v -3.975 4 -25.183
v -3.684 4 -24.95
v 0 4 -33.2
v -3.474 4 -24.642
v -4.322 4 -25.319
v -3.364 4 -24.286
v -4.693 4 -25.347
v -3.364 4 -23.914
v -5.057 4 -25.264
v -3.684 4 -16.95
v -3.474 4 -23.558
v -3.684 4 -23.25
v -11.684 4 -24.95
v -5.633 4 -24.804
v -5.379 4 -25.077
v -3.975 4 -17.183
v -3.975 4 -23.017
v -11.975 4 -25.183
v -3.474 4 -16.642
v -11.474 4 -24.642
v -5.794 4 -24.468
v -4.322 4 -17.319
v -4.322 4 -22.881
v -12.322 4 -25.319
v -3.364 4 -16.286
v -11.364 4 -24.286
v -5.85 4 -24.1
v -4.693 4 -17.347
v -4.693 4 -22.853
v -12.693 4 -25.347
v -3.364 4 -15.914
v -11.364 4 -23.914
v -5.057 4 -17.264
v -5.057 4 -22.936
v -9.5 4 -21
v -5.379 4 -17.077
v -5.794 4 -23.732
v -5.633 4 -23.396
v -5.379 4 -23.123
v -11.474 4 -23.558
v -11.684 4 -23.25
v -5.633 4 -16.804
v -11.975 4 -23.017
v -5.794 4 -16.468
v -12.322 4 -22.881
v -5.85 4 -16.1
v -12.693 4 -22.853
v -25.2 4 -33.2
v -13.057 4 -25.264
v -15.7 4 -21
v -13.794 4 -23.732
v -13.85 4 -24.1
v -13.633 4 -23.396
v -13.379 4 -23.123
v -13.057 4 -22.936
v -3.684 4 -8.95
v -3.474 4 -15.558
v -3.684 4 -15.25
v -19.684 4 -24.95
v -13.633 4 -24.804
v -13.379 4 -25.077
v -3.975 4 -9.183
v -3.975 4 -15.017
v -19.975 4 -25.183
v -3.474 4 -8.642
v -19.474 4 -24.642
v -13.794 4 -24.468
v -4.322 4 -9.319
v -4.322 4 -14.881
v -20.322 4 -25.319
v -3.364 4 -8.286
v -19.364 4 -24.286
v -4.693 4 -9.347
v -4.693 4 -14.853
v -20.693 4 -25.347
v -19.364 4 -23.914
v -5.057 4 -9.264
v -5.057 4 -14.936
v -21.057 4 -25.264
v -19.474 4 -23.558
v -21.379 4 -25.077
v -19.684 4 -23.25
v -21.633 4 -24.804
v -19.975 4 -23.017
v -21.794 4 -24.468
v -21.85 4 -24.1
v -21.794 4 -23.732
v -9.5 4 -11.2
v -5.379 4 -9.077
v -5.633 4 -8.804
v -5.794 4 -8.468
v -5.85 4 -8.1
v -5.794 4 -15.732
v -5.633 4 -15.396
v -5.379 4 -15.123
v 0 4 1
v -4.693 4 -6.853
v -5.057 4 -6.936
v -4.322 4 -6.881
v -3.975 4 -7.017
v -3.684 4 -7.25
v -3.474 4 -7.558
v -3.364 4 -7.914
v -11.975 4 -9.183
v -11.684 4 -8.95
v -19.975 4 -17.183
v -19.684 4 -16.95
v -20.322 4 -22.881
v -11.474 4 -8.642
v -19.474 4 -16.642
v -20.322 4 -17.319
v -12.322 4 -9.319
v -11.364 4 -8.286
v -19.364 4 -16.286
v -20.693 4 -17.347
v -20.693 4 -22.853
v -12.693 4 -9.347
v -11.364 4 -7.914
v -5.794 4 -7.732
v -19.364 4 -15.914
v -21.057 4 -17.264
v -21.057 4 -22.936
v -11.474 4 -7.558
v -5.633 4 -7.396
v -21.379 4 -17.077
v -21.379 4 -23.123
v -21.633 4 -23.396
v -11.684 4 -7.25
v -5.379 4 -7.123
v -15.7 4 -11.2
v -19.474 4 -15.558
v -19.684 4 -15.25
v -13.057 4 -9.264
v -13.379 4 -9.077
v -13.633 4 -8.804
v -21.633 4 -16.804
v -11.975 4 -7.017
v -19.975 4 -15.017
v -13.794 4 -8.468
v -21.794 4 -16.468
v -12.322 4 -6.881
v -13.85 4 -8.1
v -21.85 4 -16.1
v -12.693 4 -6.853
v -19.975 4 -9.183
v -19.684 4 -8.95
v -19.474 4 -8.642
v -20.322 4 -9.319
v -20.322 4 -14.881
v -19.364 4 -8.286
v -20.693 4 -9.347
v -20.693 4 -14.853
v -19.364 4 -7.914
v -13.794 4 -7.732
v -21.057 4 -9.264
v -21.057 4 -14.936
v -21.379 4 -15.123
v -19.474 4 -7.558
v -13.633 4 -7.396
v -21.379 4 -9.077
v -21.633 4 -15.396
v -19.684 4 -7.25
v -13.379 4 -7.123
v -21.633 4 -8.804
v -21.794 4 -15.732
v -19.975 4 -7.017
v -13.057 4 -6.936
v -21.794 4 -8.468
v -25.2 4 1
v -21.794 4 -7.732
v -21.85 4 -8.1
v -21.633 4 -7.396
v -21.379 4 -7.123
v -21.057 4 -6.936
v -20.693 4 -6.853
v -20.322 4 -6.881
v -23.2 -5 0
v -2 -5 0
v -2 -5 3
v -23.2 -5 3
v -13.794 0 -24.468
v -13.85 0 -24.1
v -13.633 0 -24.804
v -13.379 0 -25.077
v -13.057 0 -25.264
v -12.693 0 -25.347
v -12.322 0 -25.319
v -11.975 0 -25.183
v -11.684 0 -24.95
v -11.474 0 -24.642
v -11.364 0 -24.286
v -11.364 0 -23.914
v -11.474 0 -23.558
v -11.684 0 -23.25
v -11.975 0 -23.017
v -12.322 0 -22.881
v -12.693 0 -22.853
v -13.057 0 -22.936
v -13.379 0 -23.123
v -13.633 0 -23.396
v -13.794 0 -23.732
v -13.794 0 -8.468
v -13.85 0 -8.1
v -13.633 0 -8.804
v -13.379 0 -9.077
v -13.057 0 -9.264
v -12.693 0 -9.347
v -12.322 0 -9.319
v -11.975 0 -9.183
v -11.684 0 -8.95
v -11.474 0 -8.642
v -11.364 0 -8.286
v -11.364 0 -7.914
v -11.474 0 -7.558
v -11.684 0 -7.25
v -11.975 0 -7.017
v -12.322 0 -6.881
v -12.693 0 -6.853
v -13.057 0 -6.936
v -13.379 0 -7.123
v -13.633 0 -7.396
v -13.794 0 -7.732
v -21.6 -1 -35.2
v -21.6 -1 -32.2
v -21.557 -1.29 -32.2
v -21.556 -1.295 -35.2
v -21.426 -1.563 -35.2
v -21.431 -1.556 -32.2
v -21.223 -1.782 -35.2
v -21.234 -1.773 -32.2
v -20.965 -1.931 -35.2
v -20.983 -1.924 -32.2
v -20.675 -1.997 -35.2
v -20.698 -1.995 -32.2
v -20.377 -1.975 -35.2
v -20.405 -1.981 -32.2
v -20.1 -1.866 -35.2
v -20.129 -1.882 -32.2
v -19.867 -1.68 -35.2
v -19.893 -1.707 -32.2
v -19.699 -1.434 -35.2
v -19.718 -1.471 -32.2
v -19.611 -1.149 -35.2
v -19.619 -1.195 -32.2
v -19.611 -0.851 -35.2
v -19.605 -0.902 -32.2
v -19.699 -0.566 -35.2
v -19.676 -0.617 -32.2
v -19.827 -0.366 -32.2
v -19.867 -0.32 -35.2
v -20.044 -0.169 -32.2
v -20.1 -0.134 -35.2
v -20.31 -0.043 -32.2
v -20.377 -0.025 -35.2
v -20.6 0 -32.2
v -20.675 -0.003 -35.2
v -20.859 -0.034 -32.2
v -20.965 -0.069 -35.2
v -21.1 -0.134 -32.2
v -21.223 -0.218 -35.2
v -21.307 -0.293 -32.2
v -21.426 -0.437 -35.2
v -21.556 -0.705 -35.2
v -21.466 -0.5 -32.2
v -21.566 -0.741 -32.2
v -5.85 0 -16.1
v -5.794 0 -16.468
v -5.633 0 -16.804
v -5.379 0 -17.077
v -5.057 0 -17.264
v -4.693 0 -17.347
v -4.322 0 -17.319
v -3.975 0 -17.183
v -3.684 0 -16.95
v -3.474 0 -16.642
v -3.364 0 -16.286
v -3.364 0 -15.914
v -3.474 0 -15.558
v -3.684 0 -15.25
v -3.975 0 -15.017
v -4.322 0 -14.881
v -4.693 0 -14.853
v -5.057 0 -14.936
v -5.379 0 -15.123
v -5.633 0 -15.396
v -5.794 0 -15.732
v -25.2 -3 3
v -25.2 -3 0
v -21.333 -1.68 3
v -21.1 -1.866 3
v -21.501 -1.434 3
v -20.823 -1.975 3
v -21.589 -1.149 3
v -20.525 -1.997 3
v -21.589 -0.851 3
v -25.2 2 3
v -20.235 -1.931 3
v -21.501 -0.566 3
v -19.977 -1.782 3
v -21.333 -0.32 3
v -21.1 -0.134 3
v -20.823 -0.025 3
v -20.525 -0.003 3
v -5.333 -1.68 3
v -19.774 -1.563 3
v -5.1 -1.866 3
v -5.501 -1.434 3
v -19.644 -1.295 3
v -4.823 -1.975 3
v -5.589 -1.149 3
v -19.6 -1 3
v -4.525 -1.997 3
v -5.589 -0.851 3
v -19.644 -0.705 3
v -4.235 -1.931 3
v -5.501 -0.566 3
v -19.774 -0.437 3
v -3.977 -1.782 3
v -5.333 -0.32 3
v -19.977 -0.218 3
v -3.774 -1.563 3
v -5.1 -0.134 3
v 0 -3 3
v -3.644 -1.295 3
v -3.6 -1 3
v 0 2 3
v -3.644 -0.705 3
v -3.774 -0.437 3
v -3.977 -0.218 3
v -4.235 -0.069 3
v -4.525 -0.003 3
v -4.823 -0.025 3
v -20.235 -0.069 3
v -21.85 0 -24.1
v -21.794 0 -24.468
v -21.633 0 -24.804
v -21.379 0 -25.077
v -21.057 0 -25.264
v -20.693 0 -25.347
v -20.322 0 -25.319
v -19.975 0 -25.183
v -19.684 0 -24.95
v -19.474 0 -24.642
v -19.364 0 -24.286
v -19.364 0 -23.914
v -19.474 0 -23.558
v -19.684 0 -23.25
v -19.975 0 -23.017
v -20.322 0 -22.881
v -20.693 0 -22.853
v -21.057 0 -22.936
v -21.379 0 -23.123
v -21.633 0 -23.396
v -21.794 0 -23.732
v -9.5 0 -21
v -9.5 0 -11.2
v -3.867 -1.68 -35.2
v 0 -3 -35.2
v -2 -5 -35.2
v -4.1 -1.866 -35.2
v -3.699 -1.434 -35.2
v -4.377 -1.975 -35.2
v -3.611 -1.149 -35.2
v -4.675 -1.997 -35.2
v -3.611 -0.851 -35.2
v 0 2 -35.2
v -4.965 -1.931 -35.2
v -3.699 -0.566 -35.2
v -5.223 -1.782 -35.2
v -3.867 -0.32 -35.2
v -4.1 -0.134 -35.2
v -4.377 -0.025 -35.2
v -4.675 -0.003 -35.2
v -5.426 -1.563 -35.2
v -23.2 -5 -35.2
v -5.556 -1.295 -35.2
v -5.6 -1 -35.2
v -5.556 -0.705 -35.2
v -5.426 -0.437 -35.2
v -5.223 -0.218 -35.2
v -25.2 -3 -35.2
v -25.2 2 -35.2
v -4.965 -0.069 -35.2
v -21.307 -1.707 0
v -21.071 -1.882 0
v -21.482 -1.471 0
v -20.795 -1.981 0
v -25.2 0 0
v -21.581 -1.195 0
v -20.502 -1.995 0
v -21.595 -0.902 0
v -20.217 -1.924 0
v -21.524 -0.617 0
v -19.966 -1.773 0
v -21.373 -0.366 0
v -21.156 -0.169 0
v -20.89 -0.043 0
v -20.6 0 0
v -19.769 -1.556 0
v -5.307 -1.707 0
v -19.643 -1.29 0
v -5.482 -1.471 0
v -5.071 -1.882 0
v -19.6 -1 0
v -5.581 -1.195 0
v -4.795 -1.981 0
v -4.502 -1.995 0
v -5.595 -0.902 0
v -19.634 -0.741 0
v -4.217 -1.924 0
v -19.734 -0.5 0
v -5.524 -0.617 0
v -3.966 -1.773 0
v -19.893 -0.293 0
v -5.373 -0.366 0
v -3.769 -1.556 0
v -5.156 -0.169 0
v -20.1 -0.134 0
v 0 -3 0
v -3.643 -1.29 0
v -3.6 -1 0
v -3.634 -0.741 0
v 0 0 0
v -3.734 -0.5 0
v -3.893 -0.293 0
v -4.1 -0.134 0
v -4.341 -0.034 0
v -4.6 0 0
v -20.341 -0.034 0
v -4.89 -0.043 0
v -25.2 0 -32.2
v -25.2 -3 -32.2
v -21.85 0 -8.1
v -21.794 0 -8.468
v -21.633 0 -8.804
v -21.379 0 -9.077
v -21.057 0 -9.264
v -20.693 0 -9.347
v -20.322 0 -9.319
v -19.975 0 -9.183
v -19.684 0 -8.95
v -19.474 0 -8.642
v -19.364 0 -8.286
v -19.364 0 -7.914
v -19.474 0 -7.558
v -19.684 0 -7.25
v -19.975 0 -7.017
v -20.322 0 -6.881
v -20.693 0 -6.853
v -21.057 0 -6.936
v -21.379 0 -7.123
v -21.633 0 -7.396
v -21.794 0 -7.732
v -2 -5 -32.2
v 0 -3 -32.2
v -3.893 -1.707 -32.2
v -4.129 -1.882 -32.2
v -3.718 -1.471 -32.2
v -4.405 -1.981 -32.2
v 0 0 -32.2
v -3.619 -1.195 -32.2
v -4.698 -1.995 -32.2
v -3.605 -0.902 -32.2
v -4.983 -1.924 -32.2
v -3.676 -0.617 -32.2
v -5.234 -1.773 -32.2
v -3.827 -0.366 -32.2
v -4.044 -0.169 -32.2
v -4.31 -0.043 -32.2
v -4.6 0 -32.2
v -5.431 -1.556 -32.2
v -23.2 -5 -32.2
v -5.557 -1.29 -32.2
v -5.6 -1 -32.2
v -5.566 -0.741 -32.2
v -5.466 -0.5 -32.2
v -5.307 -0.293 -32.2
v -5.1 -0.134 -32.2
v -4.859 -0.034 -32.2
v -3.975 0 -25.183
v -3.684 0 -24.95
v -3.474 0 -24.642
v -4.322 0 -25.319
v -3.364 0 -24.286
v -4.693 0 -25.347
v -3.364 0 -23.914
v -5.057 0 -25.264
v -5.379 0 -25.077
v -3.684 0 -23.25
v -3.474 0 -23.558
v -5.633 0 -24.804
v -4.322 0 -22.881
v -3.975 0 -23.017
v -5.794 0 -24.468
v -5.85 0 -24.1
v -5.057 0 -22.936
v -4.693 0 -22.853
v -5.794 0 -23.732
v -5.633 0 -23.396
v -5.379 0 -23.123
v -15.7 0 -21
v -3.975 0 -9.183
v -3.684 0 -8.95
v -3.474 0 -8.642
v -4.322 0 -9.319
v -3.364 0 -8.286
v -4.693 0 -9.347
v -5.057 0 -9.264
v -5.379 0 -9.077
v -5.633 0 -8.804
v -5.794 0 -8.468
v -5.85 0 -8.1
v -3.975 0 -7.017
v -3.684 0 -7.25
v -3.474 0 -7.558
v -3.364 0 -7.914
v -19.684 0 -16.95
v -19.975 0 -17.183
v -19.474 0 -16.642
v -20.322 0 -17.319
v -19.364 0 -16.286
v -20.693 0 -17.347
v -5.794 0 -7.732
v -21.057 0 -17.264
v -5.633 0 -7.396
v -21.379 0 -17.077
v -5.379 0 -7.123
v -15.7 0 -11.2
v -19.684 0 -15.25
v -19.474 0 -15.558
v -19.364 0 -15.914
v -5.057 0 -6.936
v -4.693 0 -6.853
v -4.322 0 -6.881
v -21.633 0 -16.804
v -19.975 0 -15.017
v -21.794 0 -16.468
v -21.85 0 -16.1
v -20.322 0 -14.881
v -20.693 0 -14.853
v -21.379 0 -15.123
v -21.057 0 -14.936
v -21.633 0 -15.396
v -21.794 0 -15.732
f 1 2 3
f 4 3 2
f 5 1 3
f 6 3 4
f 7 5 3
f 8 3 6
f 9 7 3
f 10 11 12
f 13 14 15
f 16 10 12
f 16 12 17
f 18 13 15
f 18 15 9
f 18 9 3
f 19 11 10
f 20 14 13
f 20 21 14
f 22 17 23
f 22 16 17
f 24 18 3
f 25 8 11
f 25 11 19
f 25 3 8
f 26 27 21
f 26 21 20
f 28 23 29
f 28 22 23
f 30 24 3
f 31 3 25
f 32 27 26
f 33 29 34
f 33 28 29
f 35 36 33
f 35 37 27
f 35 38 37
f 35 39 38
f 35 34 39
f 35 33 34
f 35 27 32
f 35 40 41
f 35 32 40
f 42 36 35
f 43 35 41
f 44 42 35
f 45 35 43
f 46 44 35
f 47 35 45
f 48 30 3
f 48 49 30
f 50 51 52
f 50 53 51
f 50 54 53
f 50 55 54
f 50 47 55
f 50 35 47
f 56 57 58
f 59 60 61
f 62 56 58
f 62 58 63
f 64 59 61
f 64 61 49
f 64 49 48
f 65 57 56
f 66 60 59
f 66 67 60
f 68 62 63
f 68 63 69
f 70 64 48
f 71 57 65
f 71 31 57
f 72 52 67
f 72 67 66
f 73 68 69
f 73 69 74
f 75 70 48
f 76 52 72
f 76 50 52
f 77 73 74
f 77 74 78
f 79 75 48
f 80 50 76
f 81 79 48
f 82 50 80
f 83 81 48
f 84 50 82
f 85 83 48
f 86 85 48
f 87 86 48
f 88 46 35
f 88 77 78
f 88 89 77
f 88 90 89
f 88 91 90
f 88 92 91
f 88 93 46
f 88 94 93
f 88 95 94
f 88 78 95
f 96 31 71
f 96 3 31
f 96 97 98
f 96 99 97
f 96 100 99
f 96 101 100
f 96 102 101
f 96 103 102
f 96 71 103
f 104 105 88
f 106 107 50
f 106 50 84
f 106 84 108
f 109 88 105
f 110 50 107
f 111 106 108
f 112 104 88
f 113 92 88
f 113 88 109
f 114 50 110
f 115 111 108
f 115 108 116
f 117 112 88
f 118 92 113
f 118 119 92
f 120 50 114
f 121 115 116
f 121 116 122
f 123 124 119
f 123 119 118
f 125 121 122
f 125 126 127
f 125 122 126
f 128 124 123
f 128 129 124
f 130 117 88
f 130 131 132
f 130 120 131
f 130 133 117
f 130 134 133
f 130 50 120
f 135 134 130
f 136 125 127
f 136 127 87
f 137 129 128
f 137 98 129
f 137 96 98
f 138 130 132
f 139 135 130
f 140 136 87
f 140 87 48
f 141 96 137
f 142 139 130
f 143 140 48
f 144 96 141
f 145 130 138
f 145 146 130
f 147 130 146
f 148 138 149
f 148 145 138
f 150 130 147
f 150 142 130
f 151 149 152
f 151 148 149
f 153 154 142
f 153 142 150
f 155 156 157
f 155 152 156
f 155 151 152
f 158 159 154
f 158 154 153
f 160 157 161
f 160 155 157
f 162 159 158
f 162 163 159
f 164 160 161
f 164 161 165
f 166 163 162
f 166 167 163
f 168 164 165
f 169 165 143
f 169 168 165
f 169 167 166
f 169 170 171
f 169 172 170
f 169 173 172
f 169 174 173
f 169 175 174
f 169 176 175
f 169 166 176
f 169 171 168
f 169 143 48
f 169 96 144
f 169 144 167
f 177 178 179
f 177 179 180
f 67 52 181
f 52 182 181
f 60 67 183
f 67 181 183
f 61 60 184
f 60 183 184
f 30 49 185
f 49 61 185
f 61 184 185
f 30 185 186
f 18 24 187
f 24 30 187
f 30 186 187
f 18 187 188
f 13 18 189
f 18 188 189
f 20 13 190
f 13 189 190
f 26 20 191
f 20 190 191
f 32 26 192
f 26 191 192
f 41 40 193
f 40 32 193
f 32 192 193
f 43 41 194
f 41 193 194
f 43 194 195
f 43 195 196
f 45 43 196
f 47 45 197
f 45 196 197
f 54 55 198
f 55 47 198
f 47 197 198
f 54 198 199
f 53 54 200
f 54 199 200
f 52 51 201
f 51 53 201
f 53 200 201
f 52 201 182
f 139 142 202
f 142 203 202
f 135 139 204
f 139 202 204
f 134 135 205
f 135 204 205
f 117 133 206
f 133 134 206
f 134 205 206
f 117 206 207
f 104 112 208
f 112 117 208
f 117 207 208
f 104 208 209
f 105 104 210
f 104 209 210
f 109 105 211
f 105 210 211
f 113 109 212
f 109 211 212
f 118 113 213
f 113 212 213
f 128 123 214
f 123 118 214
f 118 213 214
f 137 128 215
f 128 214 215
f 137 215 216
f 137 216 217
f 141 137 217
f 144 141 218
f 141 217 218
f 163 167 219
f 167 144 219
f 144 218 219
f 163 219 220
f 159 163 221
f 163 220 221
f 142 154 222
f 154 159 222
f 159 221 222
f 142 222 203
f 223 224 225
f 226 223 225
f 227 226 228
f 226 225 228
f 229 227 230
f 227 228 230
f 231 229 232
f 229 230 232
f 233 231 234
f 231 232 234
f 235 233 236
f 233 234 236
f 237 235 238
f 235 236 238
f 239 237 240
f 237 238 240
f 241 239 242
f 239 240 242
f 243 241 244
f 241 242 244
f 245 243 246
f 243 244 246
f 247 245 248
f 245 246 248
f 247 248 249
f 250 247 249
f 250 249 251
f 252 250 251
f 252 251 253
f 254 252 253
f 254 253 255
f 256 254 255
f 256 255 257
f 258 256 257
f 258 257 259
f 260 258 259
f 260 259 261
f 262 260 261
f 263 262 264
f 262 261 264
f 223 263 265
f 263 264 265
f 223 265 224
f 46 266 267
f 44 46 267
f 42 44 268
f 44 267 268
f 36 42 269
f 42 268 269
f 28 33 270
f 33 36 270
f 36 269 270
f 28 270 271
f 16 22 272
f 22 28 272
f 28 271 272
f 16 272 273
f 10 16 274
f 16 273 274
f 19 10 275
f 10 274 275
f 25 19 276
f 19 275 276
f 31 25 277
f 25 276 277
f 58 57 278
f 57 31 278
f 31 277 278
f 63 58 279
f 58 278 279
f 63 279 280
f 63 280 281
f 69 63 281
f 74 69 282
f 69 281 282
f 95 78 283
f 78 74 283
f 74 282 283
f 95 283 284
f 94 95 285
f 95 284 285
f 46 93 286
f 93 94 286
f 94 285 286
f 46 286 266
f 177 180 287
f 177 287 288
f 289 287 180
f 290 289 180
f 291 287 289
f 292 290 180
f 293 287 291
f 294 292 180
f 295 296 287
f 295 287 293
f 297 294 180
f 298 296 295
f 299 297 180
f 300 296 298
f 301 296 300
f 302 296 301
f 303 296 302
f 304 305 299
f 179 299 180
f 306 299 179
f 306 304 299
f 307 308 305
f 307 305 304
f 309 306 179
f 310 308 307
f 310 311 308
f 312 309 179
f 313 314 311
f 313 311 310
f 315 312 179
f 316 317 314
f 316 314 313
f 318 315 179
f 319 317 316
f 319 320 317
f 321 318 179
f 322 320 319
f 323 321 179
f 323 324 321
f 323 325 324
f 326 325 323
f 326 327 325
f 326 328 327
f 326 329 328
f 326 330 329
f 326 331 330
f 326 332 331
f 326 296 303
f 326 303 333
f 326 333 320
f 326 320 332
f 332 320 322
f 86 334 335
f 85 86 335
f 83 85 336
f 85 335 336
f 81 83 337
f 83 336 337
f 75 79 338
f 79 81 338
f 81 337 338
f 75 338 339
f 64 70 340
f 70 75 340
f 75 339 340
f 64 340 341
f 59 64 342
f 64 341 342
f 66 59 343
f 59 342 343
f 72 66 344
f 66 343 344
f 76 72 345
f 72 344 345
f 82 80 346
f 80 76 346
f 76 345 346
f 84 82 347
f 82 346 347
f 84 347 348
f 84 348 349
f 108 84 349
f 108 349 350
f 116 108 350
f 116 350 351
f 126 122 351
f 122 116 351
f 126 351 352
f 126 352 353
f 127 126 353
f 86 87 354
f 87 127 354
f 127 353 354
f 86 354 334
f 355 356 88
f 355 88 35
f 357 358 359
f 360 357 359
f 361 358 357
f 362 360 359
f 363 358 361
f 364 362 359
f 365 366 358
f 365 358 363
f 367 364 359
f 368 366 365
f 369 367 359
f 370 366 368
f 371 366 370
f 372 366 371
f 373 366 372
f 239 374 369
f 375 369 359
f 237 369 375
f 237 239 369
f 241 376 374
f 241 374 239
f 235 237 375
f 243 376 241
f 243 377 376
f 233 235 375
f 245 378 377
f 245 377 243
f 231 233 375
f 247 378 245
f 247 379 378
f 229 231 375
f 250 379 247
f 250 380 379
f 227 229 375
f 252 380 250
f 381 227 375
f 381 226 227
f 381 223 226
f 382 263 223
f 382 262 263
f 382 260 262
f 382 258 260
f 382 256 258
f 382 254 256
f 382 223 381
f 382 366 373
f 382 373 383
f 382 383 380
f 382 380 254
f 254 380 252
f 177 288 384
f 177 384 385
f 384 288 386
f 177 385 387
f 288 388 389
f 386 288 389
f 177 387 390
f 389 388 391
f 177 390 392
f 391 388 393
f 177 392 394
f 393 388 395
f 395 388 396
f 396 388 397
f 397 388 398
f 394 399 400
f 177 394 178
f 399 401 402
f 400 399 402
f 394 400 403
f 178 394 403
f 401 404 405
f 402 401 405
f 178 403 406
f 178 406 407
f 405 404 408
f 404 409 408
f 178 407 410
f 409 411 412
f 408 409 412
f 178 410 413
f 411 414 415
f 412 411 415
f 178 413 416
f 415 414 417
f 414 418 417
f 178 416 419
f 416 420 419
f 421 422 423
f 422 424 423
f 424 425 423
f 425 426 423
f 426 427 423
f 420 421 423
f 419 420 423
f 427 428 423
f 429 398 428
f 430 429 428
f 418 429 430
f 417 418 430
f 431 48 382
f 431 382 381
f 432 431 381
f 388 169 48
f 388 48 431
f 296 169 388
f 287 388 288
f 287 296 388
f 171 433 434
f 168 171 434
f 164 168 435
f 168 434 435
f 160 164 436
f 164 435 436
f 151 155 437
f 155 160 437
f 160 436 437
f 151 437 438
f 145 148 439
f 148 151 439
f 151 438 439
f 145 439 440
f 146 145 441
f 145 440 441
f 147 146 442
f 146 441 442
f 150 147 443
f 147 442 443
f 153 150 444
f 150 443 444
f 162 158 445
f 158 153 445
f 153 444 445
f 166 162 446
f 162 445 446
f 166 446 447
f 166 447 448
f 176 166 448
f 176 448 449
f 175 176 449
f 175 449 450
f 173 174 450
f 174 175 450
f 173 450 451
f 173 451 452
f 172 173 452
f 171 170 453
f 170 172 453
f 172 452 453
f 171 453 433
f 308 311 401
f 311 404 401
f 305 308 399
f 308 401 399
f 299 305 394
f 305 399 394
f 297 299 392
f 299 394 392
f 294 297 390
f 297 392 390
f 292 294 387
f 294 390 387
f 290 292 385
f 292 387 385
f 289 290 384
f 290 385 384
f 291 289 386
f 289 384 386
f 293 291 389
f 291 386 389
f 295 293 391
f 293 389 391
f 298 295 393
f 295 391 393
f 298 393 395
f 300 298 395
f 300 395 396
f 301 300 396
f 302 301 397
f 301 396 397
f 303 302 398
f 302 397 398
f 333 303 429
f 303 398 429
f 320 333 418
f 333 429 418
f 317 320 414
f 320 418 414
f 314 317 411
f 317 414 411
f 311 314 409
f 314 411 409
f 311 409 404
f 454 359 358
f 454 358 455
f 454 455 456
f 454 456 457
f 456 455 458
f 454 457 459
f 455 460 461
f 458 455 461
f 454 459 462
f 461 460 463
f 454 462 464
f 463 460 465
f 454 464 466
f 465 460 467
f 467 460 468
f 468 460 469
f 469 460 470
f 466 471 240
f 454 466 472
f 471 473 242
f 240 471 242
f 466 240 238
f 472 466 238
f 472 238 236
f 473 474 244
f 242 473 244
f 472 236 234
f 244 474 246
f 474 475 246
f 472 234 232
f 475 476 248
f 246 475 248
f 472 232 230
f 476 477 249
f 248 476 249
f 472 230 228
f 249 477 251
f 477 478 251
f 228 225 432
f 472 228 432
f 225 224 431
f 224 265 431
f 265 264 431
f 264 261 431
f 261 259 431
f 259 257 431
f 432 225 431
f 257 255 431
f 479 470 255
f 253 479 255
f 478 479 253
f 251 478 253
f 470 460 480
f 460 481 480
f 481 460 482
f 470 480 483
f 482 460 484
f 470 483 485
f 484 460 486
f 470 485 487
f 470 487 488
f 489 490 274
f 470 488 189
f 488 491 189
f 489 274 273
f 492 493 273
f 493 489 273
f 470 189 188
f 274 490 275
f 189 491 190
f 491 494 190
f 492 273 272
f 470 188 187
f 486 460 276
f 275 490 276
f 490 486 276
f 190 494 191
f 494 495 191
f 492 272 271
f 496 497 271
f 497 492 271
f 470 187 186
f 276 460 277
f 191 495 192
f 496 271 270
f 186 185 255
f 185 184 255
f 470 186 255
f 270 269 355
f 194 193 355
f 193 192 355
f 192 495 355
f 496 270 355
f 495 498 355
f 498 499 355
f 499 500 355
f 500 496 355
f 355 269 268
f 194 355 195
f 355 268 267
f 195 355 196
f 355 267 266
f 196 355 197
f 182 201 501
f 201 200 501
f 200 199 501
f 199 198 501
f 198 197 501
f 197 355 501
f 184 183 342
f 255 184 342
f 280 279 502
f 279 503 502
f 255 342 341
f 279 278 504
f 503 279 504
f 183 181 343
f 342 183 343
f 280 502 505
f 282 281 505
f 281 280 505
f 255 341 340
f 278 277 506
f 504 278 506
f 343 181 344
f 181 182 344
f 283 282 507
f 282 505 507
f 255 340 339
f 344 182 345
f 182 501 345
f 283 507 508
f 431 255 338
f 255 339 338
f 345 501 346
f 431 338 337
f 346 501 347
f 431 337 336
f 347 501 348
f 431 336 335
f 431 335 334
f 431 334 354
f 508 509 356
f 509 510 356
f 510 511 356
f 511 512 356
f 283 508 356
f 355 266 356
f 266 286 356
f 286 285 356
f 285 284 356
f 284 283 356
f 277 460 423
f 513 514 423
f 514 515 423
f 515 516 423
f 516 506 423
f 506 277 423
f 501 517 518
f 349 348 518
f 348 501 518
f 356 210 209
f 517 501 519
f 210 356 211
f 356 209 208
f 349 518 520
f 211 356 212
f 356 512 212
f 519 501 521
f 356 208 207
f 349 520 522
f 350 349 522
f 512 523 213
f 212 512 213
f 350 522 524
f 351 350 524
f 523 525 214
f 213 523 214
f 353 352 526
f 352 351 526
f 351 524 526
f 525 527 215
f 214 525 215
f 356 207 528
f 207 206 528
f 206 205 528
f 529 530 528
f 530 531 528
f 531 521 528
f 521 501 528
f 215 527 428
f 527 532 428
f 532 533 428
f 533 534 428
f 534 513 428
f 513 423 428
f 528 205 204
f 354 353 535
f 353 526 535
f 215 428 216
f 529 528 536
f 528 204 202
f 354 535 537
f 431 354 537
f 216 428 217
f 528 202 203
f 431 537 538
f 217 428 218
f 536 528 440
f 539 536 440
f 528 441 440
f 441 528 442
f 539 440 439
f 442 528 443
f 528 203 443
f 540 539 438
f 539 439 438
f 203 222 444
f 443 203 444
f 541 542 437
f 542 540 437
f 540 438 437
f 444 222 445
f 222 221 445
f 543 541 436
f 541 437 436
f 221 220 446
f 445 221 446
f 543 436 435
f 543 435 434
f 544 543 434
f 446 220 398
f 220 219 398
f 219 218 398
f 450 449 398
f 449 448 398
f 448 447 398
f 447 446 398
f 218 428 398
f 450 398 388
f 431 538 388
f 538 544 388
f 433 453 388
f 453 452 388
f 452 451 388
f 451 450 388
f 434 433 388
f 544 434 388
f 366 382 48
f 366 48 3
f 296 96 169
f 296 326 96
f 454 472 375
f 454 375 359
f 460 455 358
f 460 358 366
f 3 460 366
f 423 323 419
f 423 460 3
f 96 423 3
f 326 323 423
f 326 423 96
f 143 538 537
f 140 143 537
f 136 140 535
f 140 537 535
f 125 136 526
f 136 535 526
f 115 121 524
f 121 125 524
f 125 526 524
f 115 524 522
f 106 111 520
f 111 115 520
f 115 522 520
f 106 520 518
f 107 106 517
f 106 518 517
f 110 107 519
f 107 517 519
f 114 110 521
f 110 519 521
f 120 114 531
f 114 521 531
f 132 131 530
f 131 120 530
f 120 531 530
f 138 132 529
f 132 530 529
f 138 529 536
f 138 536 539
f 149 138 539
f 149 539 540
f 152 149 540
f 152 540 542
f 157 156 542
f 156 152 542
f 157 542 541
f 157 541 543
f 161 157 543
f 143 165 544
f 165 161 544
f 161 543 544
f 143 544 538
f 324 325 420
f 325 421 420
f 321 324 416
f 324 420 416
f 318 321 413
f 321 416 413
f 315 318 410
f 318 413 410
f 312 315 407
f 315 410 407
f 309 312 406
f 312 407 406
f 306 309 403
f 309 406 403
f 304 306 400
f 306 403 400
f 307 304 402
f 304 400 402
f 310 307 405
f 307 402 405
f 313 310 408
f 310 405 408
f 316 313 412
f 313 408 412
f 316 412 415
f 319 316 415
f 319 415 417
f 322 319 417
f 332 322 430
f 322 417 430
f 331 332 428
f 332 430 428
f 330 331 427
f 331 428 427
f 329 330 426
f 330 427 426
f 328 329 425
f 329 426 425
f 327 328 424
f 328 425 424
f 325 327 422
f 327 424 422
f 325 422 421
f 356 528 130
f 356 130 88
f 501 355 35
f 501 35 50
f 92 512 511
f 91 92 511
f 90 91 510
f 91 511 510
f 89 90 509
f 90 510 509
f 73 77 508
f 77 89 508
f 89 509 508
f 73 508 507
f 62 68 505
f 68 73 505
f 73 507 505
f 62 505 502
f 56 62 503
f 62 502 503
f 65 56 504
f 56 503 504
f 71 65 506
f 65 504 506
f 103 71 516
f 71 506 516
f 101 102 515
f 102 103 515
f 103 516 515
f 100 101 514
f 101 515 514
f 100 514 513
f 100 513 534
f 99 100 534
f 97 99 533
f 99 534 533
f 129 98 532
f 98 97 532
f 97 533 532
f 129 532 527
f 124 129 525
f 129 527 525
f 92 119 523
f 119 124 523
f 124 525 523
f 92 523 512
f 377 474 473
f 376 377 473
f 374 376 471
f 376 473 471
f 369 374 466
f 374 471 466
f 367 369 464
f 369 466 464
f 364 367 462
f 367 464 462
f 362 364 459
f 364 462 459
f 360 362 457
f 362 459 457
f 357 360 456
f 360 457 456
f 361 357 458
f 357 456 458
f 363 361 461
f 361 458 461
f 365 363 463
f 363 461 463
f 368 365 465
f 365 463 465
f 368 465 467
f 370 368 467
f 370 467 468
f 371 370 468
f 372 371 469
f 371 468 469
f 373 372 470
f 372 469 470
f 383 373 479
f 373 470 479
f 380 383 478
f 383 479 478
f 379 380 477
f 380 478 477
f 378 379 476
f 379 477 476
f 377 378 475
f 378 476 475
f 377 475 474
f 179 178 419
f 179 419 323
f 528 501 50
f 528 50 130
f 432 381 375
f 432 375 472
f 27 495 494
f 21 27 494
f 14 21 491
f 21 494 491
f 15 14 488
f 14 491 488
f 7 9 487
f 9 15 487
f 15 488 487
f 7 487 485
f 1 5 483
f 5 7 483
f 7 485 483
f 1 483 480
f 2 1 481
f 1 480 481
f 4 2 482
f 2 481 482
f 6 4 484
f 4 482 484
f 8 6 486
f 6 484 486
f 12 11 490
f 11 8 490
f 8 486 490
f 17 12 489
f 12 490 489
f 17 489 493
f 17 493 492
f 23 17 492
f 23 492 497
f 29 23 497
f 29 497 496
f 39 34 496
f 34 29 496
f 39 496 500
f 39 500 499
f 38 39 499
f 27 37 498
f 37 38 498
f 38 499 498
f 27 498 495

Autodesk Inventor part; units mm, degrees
ref_plane "YZ Plane" through (0, 0, 0) normal (1, 0, 0) x (0, 1, 0)
ref_plane "XZ Plane" through (0, 0, 0) normal (0, 1, 0) x (-1, 0, 0)
ref_plane "XY Plane" through (0, 0, 0) normal (0, 0, 1) x (1, 0, 0)
sketch "Sketch1" plane through (0, 0, 0) normal (0, 1, 0) x (-1, 0, 0)
  line L0 (0, 0) -> (25.2, 0)
  line L1 (25.2, 0) -> (25.2, -32.2)
  line L2 (25.2, -32.2) -> (0, -32.2)
  line L3 (0, -32.2) -> (0, 0)
  line L4 (15.7, -11.2) -> (9.5, -11.2)
  line L5 (9.5, -11.2) -> (9.5, -21)
  line L6 (9.5, -21) -> (15.7, -21)
  line L7 (15.7, -21) -> (15.7, -11.2)
  circle A0 centre (20.6, -8.1) radius 1.25
  circle A1 centre (20.6, -16.1) radius 1.25
  circle A2 centre (20.6, -24.1) radius 1.25
  circle A3 centre (12.6, -8.1) radius 1.25
  circle A4 centre (12.6, -16.1) radius 1.25
  circle A5 centre (12.6, -24.1) radius 1.25
  circle A6 centre (4.6, -8.1) radius 1.25
  circle A7 centre (4.6, -16.1) radius 1.25
  circle A8 centre (4.6, -24.1) radius 1.25
  dimension "d0" = 25.2
  dimension "d1" = 32.2
  dimension "d2" = 9.5
  dimension "d3" = 9.5
  dimension "d4" = 11.2
  dimension "d5" = 11.2
  dimension "d6" = 2.5
  dimension "d9" = 8
  dimension "d12" = 8
  dimension "d15" = 4.6
  dimension "d16" = 4.6
  dimension "d17" = 16.1
  dimension "d18" = 16.1
extrude "Extrusion1" add sketch "Sketch1" along normal blind 4 contours L0 L1 L2 L3
sketch "Sketch2" plane through (-25.2, 0, 0) normal (0, 0, 1) x (1, 0, 0)
  line L0 (0, 0) -> (0, 4) projected
  line L1 (0, 4) -> (25.2, 4)
  line L2 (25.2, 4) -> (25.2, -5)
  line L3 (25.2, -5) -> (0, -5)
  line L4 (0, -5) -> (0, 4)
  circle A0 centre (4.6, -1) radius 1
  circle A1 centre (20.6, -1) radius 1
  point P0 (25.2, 0)
  dimension "d21" = 9
  dimension "d22" = 25.2
  dimension "d23" = 2
  dimension "d24" = 2
  dimension "d25" = 4.6
  dimension "d26" = 4.6
  dimension "d27" = 5
  dimension "d28" = 5
extrude "Extrusion2" add sketch "Sketch2" along normal blind 3
sketch "Sketch3" plane through (0, 0, -32.2) normal (0, 0, -1) x (-1, 0, 0)
  line L0 (0, 0) -> (0, 4)
  line L1 (0, 4) -> (25.2, 4)
  line L2 (25.2, 4) -> (25.2, -5)
  line L3 (25.2, -5) -> (0, -5)
  line L4 (0, -5) -> (0, 4)
  circle A0 centre (4.6, -1) radius 1
  circle A1 centre (20.6, -1) radius 1
  point P0 (25.2, 0)
  dimension "d31" = 9
  dimension "d32" = 25.2
  dimension "d33" = 2
  dimension "d34" = 2
  dimension "d35" = 4.6
  dimension "d36" = 4.6
  dimension "d37" = 5
  dimension "d38" = 5
extrude "Extrusion3" add sketch "Sketch3" along normal blind 3
chamfer "Chamfer1" distance 2 angle 45 6 edges at (-12.6, 4, -35.2) (-12.6, 4, 3) (0, -5, 1.5) (-25.2, -5, 1.5) (-25.2, -5, -33.7) (0, -5, -33.7)
equation "\"d3\" = d2"
equation "\"d5\" = d4"
equation "\"d15\" = d16"
equation "\"d17\" = d18"
equation "\"d24\" = d23"
equation "\"d26\" = d25"
equation "\"d28\" = d27"
equation "\"d34\" = d33"
equation "\"d36\" = d35"
equation "\"d38\" = d37"
properties part number "fixation_ax12" material "ABS Plastic"
